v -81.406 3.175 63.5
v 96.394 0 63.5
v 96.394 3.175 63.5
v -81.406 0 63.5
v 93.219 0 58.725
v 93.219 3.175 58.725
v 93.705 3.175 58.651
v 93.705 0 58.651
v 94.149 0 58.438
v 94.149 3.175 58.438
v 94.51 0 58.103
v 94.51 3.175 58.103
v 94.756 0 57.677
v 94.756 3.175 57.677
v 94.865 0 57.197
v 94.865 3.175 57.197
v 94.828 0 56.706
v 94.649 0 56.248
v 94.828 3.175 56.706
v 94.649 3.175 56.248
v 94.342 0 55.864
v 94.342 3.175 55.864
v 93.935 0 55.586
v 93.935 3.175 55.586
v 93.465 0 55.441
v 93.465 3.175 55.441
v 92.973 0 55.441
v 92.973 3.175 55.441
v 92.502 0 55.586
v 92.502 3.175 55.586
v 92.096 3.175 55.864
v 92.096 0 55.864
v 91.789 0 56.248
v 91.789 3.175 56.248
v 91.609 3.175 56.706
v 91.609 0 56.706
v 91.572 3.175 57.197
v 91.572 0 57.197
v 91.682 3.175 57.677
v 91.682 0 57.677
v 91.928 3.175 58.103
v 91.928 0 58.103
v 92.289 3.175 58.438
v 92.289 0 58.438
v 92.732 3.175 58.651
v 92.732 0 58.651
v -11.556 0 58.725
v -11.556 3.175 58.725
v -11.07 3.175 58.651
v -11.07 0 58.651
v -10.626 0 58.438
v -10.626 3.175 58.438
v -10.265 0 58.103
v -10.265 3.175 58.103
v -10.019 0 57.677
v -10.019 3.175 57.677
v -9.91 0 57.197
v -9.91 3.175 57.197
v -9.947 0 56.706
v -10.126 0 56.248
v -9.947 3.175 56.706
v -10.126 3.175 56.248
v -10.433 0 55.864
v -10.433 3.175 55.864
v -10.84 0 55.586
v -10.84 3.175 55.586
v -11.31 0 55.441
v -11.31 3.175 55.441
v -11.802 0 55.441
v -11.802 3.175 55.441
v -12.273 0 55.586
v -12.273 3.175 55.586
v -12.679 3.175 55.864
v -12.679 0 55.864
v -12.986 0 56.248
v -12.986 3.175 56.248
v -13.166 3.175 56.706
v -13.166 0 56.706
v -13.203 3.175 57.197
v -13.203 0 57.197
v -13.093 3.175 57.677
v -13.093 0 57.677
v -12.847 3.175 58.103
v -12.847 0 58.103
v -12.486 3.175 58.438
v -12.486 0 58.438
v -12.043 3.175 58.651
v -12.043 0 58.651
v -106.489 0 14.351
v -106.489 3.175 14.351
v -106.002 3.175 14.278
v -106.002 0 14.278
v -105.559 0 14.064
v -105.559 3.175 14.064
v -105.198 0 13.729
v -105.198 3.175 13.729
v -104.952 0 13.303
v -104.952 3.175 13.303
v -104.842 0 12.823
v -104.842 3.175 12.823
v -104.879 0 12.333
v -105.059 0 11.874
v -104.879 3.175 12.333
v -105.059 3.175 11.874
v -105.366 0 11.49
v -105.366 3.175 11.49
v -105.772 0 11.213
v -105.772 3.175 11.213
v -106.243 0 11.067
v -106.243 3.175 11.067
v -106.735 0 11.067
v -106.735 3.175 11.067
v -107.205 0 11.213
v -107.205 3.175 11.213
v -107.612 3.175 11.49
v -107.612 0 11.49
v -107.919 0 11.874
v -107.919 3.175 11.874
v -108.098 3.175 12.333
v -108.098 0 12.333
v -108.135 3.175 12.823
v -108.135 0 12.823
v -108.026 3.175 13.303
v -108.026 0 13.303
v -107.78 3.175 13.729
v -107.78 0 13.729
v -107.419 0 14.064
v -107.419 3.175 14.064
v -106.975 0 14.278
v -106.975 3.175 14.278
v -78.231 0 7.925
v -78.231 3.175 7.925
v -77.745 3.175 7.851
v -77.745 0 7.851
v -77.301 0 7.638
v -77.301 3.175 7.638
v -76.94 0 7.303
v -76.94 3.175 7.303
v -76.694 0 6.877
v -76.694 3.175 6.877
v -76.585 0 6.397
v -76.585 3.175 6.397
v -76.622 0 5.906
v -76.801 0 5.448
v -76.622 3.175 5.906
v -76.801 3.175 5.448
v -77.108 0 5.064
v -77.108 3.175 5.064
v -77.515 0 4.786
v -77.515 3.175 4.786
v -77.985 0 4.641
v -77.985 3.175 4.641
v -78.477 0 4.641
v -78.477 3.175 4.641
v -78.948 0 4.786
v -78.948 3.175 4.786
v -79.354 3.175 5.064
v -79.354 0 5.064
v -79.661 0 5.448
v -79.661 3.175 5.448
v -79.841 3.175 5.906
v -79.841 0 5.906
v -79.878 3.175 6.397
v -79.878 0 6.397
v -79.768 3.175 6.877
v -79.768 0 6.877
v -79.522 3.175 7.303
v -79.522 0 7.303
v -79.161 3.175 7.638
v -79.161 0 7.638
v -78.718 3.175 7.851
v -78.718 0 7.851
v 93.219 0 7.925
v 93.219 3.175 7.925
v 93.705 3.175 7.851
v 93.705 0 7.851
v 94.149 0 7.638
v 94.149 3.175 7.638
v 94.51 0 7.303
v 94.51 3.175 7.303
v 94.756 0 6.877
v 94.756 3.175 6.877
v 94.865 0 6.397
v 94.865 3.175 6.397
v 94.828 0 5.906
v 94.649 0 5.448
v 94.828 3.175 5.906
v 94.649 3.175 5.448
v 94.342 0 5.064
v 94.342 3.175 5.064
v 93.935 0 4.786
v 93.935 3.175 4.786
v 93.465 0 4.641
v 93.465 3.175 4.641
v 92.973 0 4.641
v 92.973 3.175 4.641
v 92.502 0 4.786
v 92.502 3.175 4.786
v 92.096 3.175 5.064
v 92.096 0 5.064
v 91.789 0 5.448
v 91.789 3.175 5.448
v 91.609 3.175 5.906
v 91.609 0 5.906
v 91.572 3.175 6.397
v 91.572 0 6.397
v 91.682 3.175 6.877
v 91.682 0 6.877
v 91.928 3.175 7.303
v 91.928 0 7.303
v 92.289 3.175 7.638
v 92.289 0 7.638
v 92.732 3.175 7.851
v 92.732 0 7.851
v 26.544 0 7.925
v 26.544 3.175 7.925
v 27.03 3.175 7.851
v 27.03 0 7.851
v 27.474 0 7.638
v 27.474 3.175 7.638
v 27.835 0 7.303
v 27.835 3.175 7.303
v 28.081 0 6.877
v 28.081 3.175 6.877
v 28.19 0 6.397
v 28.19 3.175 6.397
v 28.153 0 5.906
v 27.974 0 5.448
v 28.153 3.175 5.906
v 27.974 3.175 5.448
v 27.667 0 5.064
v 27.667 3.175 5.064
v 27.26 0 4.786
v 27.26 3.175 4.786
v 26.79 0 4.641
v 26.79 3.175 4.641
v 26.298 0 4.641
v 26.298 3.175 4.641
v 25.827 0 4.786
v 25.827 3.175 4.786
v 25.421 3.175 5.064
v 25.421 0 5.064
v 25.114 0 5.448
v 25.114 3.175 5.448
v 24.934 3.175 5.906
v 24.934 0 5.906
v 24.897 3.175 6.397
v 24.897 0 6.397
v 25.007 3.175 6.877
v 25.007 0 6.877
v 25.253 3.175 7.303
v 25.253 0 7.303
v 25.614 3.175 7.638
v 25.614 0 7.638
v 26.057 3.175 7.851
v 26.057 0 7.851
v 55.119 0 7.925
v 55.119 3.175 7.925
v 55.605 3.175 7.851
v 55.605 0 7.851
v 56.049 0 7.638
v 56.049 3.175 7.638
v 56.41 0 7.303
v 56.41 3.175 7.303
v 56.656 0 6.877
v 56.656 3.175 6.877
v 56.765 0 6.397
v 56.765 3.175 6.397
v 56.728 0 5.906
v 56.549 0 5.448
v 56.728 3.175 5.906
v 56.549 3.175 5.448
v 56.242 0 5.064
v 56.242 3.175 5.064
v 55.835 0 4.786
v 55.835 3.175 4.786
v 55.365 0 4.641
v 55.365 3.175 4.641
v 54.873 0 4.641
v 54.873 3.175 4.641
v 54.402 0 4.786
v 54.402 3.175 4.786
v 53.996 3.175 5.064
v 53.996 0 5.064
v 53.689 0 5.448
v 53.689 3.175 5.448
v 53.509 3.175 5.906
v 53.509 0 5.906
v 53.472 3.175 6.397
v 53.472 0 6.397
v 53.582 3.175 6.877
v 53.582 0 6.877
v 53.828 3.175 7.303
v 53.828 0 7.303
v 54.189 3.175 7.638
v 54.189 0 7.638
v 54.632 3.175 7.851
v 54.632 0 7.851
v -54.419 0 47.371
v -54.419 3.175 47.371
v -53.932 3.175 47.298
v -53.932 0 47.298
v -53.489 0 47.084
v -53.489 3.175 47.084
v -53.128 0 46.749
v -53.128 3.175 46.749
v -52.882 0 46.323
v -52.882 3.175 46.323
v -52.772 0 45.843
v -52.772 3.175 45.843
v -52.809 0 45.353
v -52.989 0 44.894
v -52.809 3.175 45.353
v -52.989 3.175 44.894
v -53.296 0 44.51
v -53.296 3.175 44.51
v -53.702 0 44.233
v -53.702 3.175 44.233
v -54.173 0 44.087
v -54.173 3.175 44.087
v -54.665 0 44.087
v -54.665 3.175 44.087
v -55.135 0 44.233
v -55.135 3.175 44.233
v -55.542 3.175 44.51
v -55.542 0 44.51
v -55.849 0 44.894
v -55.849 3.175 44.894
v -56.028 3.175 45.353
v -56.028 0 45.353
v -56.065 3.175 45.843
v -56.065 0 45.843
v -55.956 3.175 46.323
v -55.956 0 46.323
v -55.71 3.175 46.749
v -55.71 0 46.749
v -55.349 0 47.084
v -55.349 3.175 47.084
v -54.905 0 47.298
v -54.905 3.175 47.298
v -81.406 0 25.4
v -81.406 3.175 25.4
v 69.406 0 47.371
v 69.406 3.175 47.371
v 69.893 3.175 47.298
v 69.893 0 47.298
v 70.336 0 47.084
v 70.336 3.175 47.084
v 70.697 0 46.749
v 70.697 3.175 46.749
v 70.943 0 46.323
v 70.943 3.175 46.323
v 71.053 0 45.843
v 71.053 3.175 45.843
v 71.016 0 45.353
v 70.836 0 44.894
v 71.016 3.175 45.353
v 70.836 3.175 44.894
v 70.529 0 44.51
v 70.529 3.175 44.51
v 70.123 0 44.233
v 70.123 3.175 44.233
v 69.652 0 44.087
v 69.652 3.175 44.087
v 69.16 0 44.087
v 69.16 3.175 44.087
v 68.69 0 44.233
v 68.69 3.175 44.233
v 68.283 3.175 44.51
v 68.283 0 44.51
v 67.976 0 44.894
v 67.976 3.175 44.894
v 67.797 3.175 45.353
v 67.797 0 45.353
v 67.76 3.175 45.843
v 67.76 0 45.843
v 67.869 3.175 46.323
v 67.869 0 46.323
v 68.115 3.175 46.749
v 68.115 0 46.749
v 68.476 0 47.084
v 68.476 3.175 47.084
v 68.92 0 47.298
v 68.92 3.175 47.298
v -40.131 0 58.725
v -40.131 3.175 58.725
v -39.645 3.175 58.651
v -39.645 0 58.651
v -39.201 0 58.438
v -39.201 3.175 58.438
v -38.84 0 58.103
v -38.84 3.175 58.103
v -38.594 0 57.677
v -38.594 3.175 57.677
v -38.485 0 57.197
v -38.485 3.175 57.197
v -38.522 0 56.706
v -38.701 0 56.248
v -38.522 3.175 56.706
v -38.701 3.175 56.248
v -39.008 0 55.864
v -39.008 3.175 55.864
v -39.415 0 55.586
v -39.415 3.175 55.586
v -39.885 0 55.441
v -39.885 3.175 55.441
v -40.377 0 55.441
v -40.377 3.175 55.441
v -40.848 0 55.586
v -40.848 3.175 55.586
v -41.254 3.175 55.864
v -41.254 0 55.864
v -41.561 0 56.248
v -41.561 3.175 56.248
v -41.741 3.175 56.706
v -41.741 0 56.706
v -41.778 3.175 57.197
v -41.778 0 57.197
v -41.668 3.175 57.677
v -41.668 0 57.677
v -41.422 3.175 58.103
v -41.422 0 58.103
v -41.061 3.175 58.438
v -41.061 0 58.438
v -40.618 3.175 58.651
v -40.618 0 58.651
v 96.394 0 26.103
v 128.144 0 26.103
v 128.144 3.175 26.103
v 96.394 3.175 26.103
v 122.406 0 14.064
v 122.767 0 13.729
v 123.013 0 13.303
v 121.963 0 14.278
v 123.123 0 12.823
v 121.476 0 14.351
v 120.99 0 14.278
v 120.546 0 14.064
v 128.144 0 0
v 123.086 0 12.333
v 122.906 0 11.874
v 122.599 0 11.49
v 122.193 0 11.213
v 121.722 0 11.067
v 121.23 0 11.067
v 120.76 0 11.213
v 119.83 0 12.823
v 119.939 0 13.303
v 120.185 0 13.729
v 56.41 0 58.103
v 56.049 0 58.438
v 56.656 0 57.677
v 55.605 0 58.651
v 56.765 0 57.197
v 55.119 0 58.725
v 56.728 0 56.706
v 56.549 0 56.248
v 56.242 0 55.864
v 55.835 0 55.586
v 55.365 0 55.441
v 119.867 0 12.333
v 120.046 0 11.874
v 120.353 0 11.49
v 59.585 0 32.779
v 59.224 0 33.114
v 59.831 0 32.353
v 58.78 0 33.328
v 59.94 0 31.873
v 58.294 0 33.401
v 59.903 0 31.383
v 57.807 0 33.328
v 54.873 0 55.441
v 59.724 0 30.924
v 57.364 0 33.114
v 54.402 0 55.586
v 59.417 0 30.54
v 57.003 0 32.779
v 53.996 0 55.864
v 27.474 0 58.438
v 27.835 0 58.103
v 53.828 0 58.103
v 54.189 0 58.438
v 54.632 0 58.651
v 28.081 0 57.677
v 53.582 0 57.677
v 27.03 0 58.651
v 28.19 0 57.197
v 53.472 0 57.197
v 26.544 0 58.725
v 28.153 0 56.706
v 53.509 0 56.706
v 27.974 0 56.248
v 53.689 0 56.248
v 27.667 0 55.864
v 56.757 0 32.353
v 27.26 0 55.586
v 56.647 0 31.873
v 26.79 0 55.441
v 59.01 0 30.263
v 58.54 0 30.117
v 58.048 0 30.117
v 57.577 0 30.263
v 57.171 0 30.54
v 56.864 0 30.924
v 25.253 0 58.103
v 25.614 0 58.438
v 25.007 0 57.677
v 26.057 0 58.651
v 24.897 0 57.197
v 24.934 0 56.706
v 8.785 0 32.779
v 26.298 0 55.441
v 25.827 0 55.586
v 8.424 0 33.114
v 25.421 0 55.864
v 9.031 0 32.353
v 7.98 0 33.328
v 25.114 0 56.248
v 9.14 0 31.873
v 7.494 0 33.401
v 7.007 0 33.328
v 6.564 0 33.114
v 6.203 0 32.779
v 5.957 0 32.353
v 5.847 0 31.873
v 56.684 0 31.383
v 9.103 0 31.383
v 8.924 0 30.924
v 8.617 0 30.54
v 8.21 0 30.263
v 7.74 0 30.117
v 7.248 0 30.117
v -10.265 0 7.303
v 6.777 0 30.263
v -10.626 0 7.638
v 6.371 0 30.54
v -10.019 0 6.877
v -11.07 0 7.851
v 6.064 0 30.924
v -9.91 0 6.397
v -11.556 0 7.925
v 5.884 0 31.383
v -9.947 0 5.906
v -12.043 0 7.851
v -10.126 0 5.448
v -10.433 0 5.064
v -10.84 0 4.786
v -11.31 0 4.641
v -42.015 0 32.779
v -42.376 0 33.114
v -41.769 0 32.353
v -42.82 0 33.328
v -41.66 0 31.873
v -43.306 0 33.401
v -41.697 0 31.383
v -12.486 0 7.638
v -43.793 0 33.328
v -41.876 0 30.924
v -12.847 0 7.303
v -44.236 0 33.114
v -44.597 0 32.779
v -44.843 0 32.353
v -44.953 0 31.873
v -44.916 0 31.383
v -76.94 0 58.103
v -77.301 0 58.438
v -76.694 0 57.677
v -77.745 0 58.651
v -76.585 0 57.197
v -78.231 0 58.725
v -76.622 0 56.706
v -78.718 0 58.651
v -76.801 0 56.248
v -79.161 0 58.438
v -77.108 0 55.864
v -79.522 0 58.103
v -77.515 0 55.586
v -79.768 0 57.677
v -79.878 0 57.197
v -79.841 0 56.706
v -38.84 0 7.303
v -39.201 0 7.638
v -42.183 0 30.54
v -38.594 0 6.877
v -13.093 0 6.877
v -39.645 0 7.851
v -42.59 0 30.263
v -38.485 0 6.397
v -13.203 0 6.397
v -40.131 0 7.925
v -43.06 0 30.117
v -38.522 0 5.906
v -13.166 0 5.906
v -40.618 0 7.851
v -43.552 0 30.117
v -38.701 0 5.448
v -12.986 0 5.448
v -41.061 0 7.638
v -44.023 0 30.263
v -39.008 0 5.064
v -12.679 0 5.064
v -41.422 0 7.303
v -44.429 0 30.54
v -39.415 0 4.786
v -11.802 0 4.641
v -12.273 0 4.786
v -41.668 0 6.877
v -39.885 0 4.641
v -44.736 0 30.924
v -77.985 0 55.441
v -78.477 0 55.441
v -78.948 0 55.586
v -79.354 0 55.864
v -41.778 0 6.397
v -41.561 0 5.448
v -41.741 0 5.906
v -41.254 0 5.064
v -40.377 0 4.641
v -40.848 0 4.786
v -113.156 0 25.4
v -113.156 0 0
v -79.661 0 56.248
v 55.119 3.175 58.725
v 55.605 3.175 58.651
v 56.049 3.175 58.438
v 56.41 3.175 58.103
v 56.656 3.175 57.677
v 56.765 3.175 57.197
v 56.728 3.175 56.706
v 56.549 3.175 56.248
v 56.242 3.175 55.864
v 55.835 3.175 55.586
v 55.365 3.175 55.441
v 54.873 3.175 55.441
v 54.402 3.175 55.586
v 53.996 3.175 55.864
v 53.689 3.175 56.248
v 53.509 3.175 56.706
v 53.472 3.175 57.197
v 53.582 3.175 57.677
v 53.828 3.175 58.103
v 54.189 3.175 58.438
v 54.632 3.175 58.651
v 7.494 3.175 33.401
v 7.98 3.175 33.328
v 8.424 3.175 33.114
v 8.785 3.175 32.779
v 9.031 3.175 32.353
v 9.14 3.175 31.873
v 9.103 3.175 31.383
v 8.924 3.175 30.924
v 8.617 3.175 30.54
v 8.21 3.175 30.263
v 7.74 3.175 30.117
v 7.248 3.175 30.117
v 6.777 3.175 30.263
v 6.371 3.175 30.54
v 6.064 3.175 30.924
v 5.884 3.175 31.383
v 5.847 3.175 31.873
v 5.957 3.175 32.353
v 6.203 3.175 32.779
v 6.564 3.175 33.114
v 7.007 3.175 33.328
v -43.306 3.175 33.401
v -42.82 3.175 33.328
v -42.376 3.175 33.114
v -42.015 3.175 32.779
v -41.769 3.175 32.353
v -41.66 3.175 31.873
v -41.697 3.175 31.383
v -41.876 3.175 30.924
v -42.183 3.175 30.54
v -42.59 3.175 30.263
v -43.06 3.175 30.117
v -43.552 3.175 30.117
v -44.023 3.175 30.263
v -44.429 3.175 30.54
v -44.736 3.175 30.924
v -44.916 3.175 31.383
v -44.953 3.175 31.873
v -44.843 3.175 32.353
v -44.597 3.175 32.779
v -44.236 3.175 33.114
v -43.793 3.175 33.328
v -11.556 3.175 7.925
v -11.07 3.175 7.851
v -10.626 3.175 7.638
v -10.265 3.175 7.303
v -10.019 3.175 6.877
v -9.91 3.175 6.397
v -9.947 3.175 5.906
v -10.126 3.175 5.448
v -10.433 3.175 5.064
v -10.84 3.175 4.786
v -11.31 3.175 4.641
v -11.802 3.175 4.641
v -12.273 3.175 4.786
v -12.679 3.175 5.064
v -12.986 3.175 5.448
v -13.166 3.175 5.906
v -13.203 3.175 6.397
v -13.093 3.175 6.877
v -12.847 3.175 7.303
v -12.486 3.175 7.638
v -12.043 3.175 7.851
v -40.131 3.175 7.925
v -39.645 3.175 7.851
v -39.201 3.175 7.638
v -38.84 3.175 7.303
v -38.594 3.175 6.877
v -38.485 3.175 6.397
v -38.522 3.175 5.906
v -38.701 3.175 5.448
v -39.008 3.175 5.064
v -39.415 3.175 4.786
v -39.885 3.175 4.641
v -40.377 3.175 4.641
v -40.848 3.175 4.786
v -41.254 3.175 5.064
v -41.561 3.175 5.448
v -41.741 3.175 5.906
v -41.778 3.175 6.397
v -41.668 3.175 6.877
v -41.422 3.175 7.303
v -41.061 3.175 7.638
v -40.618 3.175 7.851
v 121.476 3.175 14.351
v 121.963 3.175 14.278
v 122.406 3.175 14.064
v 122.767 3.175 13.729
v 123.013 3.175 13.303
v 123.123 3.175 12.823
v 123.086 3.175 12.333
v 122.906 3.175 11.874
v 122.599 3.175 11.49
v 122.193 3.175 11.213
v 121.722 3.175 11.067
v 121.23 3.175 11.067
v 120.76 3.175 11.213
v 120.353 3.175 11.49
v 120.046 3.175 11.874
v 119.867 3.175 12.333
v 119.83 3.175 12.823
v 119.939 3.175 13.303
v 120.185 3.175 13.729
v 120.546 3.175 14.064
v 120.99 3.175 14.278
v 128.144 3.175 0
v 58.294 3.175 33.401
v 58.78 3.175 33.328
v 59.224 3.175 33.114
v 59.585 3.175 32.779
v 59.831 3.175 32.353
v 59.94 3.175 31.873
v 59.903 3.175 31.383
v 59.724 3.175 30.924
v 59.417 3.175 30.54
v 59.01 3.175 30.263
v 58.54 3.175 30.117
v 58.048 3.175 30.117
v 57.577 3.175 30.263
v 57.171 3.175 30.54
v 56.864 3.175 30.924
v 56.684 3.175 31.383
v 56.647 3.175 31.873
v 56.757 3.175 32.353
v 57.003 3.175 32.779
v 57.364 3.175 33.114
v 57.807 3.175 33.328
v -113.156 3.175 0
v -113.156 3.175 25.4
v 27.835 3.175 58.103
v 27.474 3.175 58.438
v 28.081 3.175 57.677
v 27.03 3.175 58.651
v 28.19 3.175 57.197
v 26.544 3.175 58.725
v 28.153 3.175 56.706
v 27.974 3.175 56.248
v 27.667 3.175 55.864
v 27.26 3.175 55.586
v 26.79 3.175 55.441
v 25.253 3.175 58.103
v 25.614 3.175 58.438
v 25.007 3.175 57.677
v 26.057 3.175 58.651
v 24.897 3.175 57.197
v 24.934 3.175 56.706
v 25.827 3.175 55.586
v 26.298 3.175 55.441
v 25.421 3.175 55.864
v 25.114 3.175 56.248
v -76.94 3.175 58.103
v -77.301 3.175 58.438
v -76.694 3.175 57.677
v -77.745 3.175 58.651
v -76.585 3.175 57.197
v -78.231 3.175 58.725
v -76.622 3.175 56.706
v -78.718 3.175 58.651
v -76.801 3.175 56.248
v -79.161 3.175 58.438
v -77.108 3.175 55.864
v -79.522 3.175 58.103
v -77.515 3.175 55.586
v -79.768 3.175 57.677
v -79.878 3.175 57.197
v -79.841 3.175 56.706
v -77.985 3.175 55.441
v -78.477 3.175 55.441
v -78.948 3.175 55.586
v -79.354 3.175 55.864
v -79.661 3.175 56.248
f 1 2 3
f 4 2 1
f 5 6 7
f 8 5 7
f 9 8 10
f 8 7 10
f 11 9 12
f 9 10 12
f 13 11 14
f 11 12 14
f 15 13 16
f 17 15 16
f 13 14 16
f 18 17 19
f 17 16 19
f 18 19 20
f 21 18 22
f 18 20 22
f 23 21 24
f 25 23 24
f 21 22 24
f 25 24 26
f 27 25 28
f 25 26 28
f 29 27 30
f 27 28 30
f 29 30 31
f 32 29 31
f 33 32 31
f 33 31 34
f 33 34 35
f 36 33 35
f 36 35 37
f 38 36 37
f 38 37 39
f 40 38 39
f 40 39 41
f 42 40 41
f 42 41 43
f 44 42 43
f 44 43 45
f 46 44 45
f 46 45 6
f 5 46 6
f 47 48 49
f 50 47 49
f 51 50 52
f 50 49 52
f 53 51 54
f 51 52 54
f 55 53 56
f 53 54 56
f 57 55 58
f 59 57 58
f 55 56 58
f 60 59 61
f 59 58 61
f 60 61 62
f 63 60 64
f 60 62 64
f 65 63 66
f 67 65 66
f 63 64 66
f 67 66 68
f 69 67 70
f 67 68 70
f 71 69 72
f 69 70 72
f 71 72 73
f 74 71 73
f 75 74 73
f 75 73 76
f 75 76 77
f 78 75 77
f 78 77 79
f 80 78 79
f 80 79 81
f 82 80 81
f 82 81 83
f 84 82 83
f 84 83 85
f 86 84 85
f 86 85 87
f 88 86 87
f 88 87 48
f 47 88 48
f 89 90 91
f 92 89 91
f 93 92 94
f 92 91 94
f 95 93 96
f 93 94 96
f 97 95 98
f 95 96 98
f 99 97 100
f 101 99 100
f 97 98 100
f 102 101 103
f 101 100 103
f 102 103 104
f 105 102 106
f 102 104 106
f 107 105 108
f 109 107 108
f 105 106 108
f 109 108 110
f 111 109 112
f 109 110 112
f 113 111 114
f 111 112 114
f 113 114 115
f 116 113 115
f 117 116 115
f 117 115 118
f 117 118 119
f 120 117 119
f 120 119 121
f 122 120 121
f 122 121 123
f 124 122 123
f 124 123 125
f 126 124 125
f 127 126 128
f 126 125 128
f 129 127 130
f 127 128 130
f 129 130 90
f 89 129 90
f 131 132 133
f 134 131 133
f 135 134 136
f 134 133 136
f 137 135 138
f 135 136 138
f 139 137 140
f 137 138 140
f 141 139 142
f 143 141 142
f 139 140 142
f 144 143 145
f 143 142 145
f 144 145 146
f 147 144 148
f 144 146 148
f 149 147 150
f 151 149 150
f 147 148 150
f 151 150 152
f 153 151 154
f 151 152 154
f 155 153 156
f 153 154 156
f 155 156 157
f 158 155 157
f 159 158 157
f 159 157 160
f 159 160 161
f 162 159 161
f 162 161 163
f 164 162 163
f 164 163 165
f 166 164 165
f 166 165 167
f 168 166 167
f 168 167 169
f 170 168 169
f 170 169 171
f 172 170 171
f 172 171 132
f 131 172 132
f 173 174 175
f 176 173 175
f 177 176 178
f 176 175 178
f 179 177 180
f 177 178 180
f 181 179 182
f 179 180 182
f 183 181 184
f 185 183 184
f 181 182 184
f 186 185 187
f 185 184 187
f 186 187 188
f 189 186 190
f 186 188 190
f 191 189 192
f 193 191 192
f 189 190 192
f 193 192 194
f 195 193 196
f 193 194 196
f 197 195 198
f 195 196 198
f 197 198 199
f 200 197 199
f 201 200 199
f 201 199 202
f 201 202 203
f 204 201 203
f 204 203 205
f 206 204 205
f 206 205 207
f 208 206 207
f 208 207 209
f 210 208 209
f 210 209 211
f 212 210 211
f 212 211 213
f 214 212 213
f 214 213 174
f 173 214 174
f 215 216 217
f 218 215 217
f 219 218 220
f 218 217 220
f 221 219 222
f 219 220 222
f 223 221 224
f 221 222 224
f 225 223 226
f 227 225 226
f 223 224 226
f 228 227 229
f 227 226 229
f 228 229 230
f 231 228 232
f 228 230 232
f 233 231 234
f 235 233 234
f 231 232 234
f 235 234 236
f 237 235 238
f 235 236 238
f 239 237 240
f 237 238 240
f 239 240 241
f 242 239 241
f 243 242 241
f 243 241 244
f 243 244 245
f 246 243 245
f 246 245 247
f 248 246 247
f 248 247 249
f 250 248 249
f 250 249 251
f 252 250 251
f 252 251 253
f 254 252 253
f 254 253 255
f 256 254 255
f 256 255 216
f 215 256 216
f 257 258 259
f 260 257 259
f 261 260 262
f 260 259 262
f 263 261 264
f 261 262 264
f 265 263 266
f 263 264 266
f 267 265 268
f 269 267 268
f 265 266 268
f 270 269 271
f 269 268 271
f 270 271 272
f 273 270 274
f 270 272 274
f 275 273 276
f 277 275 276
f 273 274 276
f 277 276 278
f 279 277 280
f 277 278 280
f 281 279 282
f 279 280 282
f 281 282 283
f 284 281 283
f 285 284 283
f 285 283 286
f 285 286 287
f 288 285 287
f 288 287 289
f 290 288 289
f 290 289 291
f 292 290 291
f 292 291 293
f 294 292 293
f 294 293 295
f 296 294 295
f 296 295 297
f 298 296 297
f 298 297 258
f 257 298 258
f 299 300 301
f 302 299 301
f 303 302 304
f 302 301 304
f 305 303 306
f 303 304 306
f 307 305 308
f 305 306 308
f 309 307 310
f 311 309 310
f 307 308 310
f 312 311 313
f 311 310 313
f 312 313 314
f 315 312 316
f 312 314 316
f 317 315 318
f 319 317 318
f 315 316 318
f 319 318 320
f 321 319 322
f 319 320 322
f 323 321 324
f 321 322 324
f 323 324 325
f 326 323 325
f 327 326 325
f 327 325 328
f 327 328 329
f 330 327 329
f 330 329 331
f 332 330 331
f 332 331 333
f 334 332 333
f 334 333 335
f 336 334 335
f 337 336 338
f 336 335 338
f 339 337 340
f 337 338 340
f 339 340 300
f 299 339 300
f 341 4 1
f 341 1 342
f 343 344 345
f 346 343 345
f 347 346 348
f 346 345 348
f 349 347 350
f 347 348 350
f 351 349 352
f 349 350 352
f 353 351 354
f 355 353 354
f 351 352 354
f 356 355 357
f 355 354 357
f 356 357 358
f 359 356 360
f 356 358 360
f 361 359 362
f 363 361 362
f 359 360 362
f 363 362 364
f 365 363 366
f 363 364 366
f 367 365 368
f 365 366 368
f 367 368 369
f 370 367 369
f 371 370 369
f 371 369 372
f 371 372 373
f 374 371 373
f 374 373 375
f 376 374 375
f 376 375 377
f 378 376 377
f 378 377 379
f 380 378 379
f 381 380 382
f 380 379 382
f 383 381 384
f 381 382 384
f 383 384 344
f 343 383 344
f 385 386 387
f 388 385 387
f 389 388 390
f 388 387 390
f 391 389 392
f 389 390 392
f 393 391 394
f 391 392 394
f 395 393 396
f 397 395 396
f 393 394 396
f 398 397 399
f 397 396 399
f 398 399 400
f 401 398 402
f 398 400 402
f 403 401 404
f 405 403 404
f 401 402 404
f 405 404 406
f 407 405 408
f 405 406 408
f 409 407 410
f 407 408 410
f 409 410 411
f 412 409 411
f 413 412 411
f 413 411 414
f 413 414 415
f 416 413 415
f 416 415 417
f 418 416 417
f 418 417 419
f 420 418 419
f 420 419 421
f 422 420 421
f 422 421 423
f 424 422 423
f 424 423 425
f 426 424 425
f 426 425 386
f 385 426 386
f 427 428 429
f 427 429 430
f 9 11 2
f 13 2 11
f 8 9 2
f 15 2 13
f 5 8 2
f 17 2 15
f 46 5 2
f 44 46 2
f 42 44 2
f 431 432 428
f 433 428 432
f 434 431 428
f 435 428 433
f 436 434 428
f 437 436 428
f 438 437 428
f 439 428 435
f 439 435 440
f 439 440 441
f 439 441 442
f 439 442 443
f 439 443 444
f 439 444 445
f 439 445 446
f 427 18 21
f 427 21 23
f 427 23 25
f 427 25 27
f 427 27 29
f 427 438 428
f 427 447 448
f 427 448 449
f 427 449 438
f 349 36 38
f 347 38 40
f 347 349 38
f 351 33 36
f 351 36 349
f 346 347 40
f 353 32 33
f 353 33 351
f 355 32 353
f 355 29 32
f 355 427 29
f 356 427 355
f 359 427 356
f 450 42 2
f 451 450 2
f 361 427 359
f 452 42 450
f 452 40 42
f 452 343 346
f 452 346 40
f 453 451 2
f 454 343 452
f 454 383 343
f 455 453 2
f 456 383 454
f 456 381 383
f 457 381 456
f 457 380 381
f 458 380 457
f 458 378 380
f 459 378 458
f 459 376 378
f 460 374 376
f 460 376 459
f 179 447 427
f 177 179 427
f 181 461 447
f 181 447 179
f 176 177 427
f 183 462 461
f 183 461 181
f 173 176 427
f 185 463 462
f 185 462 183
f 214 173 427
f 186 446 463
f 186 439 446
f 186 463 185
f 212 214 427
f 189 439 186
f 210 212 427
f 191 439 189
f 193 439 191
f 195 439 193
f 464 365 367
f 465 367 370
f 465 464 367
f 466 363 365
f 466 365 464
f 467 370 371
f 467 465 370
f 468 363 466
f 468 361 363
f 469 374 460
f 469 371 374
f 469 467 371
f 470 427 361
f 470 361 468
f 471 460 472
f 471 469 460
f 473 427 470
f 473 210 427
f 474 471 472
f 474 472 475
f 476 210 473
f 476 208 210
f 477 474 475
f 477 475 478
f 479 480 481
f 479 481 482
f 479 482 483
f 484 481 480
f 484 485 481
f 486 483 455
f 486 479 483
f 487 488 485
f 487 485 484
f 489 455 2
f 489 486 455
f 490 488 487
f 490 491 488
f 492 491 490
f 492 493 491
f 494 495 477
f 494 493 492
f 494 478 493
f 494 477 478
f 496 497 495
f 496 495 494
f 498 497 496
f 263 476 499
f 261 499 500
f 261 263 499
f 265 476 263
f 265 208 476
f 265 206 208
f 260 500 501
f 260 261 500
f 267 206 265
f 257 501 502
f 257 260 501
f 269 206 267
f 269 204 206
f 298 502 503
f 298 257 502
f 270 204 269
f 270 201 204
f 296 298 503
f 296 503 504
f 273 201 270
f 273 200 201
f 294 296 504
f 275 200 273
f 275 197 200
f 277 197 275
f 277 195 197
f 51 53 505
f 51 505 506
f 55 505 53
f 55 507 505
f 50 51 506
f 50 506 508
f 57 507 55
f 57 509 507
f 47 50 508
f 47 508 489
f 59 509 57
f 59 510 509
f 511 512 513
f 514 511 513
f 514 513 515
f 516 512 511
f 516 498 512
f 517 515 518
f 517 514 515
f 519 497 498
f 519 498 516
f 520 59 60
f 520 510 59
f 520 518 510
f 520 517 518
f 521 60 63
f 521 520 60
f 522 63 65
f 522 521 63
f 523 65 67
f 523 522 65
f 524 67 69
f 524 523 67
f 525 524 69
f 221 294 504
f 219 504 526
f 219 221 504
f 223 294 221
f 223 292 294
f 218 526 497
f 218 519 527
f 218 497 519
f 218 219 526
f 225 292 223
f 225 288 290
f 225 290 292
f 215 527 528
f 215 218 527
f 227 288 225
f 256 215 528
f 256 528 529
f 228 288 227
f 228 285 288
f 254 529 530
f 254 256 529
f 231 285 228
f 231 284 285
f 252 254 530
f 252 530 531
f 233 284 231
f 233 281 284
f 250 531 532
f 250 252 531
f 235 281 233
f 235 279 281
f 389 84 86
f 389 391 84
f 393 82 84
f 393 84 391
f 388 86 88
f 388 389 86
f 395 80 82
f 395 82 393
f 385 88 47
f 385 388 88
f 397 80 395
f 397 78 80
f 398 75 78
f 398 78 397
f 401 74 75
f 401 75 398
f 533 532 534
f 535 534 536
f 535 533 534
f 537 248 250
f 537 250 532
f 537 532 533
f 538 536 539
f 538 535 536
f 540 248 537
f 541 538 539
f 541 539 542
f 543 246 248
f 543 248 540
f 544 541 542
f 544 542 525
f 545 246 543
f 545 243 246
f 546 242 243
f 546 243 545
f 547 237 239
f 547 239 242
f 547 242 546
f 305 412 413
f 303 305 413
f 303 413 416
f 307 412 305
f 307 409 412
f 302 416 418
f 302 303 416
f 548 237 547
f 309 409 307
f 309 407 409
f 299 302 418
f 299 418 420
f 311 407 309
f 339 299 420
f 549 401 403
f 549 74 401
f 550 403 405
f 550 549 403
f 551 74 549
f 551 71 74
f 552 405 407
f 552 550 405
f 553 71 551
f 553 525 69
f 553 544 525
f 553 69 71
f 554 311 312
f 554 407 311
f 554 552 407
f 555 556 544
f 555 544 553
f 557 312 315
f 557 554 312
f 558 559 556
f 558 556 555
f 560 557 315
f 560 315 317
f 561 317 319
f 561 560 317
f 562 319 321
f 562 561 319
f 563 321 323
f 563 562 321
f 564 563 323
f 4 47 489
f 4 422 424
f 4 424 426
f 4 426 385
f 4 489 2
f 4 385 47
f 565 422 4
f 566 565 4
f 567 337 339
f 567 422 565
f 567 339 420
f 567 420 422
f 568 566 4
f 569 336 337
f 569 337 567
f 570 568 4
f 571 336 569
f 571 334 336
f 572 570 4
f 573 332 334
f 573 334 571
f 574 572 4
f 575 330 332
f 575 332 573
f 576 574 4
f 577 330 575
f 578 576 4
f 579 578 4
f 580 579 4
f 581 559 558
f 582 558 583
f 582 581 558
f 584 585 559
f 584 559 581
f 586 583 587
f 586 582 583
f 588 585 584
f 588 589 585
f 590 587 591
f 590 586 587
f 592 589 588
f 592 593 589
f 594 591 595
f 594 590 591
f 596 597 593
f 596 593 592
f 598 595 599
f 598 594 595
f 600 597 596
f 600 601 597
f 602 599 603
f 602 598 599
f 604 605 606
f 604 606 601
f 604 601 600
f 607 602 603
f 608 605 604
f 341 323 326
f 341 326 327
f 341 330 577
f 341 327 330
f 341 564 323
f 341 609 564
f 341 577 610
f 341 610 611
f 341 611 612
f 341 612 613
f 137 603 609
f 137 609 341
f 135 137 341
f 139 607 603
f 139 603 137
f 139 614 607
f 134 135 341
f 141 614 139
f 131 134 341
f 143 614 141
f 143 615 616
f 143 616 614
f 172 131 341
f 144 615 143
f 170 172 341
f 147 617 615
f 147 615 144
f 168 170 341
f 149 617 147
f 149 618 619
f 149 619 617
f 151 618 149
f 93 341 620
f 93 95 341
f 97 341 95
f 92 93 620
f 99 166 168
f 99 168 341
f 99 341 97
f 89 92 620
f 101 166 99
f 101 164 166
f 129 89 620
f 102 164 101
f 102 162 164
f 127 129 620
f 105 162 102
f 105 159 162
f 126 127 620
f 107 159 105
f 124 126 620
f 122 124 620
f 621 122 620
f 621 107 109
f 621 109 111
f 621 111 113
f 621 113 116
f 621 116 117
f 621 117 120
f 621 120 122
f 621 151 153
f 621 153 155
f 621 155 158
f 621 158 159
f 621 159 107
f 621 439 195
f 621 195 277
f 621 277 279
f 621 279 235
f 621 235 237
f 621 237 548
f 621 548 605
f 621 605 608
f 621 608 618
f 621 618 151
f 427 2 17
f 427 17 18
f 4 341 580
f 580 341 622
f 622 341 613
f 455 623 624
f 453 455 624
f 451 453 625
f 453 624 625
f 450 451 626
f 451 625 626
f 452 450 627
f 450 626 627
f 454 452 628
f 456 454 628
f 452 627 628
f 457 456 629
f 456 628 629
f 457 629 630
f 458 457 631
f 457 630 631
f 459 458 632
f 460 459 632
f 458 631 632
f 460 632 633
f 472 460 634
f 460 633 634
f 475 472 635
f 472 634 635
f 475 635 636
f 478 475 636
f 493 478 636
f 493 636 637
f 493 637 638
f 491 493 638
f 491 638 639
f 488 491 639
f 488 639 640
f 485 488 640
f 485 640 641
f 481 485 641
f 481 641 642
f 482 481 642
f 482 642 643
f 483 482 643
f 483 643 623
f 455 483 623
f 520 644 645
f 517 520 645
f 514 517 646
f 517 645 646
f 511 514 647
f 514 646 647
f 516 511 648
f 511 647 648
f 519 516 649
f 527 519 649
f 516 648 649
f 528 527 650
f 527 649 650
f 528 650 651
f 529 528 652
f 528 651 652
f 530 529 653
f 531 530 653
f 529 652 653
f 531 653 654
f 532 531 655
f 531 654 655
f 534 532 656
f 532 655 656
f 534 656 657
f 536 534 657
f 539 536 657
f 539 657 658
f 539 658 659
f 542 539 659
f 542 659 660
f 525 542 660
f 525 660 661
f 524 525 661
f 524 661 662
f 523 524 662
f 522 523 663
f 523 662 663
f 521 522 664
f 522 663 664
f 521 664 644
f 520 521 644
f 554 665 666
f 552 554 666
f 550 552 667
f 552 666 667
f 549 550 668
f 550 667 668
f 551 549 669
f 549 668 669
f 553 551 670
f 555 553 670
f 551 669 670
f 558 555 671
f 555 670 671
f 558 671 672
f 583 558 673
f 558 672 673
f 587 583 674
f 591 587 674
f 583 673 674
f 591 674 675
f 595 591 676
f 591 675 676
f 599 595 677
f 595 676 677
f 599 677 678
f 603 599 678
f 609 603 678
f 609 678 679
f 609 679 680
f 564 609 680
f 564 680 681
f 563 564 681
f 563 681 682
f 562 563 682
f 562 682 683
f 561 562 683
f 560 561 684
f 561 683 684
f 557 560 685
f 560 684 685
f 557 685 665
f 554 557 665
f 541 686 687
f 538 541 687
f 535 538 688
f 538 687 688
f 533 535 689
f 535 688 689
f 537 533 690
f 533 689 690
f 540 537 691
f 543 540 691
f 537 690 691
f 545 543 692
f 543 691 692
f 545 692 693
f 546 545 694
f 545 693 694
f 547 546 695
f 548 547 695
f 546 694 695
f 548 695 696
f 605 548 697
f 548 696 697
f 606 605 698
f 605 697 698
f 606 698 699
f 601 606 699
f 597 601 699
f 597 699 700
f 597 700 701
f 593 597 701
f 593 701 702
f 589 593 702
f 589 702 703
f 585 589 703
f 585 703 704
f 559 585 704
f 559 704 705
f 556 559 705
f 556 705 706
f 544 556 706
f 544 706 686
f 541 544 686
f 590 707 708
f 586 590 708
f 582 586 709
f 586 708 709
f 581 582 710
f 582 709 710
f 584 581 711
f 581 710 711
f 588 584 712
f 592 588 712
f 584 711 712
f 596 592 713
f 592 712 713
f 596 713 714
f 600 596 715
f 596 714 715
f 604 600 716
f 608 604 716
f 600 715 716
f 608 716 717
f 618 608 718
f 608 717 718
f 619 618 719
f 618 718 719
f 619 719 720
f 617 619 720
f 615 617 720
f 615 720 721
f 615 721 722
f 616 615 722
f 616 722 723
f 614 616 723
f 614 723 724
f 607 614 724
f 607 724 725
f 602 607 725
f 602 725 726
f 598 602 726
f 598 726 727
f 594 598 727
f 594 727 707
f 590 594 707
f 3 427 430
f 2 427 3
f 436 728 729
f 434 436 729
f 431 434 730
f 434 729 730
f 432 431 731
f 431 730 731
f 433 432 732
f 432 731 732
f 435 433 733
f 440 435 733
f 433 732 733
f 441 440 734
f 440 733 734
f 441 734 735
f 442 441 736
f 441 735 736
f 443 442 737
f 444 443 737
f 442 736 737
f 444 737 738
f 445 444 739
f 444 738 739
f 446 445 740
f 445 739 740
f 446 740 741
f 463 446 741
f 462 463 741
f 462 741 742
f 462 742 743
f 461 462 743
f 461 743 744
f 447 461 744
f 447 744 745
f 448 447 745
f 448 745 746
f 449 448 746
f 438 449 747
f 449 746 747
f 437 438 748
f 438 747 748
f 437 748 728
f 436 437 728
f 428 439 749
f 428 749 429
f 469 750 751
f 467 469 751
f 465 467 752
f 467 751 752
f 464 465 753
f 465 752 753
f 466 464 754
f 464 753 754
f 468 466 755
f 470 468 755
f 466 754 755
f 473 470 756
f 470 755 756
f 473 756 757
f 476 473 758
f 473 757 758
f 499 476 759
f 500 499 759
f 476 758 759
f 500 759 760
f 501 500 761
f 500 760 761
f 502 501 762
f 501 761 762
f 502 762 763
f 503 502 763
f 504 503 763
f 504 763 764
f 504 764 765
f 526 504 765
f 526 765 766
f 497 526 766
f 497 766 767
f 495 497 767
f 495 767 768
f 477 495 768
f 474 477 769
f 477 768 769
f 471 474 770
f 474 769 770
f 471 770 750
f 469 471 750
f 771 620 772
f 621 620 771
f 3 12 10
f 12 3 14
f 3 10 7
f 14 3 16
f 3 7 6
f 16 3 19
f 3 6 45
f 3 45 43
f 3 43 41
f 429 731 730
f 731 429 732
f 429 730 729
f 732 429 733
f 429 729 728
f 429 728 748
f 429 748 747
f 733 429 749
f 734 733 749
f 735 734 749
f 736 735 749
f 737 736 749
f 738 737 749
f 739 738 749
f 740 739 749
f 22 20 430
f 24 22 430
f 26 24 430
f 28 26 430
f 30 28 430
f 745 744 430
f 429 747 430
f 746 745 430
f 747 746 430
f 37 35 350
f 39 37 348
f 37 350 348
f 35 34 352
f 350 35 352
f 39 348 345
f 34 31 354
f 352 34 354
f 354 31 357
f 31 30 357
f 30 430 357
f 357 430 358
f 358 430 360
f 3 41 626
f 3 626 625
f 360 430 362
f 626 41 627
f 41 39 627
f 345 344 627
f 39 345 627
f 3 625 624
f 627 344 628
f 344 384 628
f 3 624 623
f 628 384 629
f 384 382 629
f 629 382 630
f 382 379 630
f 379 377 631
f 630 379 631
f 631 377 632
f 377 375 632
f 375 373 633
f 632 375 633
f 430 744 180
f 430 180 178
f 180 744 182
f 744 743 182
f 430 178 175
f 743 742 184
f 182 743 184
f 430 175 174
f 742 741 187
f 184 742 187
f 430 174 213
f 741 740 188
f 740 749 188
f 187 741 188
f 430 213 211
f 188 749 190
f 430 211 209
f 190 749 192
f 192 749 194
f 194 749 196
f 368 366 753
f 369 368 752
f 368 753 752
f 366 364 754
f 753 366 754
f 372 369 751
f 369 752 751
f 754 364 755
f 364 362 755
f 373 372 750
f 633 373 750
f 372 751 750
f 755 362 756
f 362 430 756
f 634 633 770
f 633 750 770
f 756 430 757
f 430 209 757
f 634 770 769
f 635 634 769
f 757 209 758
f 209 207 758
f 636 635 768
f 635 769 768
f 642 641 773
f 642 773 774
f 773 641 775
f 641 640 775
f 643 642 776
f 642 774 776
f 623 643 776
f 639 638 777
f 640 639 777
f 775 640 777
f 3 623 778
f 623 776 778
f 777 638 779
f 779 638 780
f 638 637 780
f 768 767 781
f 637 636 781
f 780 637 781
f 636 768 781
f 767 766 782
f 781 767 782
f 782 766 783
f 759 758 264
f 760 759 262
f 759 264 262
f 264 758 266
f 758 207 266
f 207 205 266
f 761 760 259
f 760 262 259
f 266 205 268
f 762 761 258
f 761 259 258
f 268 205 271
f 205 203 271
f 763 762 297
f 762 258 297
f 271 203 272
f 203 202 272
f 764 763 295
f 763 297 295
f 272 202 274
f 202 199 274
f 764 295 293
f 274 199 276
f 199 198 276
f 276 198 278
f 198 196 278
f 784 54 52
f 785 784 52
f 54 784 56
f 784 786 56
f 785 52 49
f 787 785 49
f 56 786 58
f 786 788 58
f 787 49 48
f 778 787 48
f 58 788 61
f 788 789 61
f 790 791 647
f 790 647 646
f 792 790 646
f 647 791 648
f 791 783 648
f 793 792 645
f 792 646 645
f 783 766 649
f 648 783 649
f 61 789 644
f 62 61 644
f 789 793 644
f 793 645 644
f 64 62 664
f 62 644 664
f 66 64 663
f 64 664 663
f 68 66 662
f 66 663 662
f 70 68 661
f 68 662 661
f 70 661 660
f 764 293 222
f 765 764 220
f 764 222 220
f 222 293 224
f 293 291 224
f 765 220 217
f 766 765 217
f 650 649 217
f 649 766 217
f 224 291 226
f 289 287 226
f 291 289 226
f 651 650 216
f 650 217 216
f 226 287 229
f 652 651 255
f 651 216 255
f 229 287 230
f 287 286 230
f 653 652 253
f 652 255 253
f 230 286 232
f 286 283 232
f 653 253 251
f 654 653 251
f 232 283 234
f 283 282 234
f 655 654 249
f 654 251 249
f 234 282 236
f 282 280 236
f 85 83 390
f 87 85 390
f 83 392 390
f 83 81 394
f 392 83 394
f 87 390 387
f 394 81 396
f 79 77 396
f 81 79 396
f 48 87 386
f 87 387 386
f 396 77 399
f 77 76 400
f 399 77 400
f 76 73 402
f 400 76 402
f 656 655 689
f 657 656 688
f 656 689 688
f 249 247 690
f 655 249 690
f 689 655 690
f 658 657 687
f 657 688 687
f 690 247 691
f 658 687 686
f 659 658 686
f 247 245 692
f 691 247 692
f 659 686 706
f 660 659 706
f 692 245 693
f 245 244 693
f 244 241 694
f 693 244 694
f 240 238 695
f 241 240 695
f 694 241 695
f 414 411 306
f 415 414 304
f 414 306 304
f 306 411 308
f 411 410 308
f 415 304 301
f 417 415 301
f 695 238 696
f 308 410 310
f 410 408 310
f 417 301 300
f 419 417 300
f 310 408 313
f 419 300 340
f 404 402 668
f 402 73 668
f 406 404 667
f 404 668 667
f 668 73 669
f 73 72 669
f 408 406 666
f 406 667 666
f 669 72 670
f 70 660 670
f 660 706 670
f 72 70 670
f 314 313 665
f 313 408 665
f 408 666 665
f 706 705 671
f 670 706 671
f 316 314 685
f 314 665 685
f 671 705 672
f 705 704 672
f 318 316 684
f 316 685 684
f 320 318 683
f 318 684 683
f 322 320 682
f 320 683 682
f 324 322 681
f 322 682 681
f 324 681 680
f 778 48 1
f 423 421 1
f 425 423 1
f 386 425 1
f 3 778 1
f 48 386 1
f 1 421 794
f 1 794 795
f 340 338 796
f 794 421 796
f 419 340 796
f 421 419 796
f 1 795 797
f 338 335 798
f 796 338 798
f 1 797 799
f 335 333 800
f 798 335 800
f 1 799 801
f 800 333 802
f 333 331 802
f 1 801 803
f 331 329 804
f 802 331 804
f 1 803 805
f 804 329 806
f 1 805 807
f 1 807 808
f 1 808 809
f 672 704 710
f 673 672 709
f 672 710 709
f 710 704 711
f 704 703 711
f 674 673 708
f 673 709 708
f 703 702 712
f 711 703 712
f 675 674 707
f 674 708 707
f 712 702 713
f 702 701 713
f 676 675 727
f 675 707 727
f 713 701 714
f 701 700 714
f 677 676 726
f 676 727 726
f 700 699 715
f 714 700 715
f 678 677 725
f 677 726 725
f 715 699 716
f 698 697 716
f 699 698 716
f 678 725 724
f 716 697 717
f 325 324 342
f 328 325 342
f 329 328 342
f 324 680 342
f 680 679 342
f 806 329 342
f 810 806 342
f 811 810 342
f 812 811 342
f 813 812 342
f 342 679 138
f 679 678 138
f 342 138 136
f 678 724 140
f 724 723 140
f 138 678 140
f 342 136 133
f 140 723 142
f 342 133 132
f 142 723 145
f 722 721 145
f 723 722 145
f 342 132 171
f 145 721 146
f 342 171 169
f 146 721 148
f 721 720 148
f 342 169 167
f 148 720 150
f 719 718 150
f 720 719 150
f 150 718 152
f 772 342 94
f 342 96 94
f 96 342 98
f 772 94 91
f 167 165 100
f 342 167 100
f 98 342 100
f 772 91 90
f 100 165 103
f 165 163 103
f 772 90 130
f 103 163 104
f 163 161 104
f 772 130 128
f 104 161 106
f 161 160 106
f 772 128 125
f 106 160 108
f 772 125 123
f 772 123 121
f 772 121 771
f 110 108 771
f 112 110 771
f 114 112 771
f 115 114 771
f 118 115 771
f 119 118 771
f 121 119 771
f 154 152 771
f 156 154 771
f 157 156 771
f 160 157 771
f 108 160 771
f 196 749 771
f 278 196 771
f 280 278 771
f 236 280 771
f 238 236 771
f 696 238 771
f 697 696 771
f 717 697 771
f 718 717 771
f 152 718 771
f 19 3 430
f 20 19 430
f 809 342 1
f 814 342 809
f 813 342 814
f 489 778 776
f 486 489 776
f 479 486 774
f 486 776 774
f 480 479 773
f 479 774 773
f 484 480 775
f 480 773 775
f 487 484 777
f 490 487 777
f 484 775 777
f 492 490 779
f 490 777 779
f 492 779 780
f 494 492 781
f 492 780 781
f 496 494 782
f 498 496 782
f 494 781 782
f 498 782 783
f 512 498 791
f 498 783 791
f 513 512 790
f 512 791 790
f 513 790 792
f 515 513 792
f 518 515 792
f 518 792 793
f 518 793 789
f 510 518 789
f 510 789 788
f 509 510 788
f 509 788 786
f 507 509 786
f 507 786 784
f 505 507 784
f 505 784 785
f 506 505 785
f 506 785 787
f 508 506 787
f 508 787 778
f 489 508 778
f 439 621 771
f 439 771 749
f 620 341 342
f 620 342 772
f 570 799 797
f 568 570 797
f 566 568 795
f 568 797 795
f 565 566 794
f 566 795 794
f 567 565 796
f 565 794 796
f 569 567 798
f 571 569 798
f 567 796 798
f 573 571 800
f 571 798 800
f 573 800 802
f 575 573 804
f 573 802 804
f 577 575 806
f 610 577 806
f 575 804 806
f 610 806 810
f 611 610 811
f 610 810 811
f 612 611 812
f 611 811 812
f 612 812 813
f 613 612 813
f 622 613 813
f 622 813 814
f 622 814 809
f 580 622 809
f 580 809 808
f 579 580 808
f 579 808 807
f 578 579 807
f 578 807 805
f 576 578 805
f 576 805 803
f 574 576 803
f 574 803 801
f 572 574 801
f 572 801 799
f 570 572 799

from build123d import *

# Parameters (mm, degrees)
BOSS_EXTRUDE2_DEPTH = 3.175
SKETCH5_R           = 1.651
CUT_EXTRUDE3_DEPTH  = 3.175
SKETCH6_R           = 1.651
CUT_EXTRUDE4_DEPTH  = 3.175
SKETCH7_R           = 1.651
CUT_EXTRUDE5_DEPTH  = 3.81
SKETCH8_R           = 1.651
CUT_EXTRUDE6_DEPTH  = 3.81


with BuildPart() as part:
    # Sketch4 → Boss-Extrude2 (new body)
    with BuildSketch(Plane(origin=(0, 0, 0), x_dir=(1, 0, 0), z_dir=(0, 1, 0))):
        Polygon((-113.15621118, 0), (128.14378882, 0), (128.14378882, -26.103364389), (96.39378882, -26.103364389), (96.39378882, -63.5), (-81.40621118, -63.5), (-81.40621118, -25.4), (-113.15621118, -25.4), align=None)
    extrude(amount=BOSS_EXTRUDE2_DEPTH)

    # Sketch5 → Cut-Extrude3 (cut)
    with BuildSketch(Plane(origin=(0, 3.175, 0), x_dir=(1, 0, 0), z_dir=(0, 1, 0))):
        with Locations(Location((7.49378882, -31.75, 0), (0, 0, 270))):
            Circle(SKETCH5_R)
        with Locations(Location((58.29378882, -31.75, 0), (0, 0, 270))):
            Circle(SKETCH5_R)
        with Locations(Location((-43.30621118, -31.75, 0), (0, 0, 270))):
            Circle(SKETCH5_R)
    extrude(amount=-CUT_EXTRUDE3_DEPTH, mode=Mode.SUBTRACT)

    # Sketch6 → Cut-Extrude4 (cut)
    with BuildSketch(Plane(origin=(0, 3.175, 0), x_dir=(1, 0, 0), z_dir=(0, 1, 0))):
        with Locations(Location((69.40628882, -45.72, 0), (0, 0, 270))):
            Circle(SKETCH6_R)
        with Locations(Location((-54.41871118, -45.72, 0), (0, 0, 270))):
            Circle(SKETCH6_R)
        with Locations(Location((121.47628882, -12.7, 0), (0, 0, 270))):
            Circle(SKETCH6_R)
        with Locations(Location((-106.48871118, -12.7, 0), (0, 0, 270))):
            Circle(SKETCH6_R)
    extrude(amount=-CUT_EXTRUDE4_DEPTH, mode=Mode.SUBTRACT)

    # Sketch7 → Cut-Extrude5 (cut)
    with BuildSketch(Plane(origin=(0, 3.175, 0), x_dir=(1, 0, 0), z_dir=(0, 1, 0))):
        with Locations(Location((93.21878882, -57.0738, 0), (0, 0, 270))):
            Circle(SKETCH7_R)
        with Locations(Location((55.11878882, -57.0738, 0), (0, 0, 270))):
            Circle(SKETCH7_R)
        with Locations(Location((26.54378882, -57.0738, 0), (0, 0, 270))):
            Circle(SKETCH7_R)
        with Locations(Location((-11.55621118, -57.0738, 0), (0, 0, 270))):
            Circle(SKETCH7_R)
        with Locations(Location((-40.13121118, -57.0738, 0), (0, 0, 270))):
            Circle(SKETCH7_R)
        with Locations(Location((-78.23121118, -57.0738, 0), (0, 0, 270))):
            Circle(SKETCH7_R)
    extrude(amount=-CUT_EXTRUDE5_DEPTH, mode=Mode.SUBTRACT)

    # Sketch8 → Cut-Extrude6 (cut)
    with BuildSketch(Plane(origin=(0, 3.175, 0), x_dir=(1, 0, 0), z_dir=(0, 1, 0))):
        with Locations(Location((93.21878882, -6.2738, 0), (0, 0, 270))):
            Circle(SKETCH8_R)
        with Locations(Location((55.11878882, -6.2738, 0), (0, 0, 270))):
            Circle(SKETCH8_R)
        with Locations(Location((26.54378882, -6.2738, 0), (0, 0, 270))):
            Circle(SKETCH8_R)
        with Locations(Location((-11.55621118, -6.2738, 0), (0, 0, 270))):
            Circle(SKETCH8_R)
        with Locations(Location((-40.13121118, -6.2738, 0), (0, 0, 270))):
            Circle(SKETCH8_R)
        with Locations(Location((-78.23121118, -6.2738, 0), (0, 0, 270))):
            Circle(SKETCH8_R)
    extrude(amount=-CUT_EXTRUDE6_DEPTH, mode=Mode.SUBTRACT)


solid = part.part
